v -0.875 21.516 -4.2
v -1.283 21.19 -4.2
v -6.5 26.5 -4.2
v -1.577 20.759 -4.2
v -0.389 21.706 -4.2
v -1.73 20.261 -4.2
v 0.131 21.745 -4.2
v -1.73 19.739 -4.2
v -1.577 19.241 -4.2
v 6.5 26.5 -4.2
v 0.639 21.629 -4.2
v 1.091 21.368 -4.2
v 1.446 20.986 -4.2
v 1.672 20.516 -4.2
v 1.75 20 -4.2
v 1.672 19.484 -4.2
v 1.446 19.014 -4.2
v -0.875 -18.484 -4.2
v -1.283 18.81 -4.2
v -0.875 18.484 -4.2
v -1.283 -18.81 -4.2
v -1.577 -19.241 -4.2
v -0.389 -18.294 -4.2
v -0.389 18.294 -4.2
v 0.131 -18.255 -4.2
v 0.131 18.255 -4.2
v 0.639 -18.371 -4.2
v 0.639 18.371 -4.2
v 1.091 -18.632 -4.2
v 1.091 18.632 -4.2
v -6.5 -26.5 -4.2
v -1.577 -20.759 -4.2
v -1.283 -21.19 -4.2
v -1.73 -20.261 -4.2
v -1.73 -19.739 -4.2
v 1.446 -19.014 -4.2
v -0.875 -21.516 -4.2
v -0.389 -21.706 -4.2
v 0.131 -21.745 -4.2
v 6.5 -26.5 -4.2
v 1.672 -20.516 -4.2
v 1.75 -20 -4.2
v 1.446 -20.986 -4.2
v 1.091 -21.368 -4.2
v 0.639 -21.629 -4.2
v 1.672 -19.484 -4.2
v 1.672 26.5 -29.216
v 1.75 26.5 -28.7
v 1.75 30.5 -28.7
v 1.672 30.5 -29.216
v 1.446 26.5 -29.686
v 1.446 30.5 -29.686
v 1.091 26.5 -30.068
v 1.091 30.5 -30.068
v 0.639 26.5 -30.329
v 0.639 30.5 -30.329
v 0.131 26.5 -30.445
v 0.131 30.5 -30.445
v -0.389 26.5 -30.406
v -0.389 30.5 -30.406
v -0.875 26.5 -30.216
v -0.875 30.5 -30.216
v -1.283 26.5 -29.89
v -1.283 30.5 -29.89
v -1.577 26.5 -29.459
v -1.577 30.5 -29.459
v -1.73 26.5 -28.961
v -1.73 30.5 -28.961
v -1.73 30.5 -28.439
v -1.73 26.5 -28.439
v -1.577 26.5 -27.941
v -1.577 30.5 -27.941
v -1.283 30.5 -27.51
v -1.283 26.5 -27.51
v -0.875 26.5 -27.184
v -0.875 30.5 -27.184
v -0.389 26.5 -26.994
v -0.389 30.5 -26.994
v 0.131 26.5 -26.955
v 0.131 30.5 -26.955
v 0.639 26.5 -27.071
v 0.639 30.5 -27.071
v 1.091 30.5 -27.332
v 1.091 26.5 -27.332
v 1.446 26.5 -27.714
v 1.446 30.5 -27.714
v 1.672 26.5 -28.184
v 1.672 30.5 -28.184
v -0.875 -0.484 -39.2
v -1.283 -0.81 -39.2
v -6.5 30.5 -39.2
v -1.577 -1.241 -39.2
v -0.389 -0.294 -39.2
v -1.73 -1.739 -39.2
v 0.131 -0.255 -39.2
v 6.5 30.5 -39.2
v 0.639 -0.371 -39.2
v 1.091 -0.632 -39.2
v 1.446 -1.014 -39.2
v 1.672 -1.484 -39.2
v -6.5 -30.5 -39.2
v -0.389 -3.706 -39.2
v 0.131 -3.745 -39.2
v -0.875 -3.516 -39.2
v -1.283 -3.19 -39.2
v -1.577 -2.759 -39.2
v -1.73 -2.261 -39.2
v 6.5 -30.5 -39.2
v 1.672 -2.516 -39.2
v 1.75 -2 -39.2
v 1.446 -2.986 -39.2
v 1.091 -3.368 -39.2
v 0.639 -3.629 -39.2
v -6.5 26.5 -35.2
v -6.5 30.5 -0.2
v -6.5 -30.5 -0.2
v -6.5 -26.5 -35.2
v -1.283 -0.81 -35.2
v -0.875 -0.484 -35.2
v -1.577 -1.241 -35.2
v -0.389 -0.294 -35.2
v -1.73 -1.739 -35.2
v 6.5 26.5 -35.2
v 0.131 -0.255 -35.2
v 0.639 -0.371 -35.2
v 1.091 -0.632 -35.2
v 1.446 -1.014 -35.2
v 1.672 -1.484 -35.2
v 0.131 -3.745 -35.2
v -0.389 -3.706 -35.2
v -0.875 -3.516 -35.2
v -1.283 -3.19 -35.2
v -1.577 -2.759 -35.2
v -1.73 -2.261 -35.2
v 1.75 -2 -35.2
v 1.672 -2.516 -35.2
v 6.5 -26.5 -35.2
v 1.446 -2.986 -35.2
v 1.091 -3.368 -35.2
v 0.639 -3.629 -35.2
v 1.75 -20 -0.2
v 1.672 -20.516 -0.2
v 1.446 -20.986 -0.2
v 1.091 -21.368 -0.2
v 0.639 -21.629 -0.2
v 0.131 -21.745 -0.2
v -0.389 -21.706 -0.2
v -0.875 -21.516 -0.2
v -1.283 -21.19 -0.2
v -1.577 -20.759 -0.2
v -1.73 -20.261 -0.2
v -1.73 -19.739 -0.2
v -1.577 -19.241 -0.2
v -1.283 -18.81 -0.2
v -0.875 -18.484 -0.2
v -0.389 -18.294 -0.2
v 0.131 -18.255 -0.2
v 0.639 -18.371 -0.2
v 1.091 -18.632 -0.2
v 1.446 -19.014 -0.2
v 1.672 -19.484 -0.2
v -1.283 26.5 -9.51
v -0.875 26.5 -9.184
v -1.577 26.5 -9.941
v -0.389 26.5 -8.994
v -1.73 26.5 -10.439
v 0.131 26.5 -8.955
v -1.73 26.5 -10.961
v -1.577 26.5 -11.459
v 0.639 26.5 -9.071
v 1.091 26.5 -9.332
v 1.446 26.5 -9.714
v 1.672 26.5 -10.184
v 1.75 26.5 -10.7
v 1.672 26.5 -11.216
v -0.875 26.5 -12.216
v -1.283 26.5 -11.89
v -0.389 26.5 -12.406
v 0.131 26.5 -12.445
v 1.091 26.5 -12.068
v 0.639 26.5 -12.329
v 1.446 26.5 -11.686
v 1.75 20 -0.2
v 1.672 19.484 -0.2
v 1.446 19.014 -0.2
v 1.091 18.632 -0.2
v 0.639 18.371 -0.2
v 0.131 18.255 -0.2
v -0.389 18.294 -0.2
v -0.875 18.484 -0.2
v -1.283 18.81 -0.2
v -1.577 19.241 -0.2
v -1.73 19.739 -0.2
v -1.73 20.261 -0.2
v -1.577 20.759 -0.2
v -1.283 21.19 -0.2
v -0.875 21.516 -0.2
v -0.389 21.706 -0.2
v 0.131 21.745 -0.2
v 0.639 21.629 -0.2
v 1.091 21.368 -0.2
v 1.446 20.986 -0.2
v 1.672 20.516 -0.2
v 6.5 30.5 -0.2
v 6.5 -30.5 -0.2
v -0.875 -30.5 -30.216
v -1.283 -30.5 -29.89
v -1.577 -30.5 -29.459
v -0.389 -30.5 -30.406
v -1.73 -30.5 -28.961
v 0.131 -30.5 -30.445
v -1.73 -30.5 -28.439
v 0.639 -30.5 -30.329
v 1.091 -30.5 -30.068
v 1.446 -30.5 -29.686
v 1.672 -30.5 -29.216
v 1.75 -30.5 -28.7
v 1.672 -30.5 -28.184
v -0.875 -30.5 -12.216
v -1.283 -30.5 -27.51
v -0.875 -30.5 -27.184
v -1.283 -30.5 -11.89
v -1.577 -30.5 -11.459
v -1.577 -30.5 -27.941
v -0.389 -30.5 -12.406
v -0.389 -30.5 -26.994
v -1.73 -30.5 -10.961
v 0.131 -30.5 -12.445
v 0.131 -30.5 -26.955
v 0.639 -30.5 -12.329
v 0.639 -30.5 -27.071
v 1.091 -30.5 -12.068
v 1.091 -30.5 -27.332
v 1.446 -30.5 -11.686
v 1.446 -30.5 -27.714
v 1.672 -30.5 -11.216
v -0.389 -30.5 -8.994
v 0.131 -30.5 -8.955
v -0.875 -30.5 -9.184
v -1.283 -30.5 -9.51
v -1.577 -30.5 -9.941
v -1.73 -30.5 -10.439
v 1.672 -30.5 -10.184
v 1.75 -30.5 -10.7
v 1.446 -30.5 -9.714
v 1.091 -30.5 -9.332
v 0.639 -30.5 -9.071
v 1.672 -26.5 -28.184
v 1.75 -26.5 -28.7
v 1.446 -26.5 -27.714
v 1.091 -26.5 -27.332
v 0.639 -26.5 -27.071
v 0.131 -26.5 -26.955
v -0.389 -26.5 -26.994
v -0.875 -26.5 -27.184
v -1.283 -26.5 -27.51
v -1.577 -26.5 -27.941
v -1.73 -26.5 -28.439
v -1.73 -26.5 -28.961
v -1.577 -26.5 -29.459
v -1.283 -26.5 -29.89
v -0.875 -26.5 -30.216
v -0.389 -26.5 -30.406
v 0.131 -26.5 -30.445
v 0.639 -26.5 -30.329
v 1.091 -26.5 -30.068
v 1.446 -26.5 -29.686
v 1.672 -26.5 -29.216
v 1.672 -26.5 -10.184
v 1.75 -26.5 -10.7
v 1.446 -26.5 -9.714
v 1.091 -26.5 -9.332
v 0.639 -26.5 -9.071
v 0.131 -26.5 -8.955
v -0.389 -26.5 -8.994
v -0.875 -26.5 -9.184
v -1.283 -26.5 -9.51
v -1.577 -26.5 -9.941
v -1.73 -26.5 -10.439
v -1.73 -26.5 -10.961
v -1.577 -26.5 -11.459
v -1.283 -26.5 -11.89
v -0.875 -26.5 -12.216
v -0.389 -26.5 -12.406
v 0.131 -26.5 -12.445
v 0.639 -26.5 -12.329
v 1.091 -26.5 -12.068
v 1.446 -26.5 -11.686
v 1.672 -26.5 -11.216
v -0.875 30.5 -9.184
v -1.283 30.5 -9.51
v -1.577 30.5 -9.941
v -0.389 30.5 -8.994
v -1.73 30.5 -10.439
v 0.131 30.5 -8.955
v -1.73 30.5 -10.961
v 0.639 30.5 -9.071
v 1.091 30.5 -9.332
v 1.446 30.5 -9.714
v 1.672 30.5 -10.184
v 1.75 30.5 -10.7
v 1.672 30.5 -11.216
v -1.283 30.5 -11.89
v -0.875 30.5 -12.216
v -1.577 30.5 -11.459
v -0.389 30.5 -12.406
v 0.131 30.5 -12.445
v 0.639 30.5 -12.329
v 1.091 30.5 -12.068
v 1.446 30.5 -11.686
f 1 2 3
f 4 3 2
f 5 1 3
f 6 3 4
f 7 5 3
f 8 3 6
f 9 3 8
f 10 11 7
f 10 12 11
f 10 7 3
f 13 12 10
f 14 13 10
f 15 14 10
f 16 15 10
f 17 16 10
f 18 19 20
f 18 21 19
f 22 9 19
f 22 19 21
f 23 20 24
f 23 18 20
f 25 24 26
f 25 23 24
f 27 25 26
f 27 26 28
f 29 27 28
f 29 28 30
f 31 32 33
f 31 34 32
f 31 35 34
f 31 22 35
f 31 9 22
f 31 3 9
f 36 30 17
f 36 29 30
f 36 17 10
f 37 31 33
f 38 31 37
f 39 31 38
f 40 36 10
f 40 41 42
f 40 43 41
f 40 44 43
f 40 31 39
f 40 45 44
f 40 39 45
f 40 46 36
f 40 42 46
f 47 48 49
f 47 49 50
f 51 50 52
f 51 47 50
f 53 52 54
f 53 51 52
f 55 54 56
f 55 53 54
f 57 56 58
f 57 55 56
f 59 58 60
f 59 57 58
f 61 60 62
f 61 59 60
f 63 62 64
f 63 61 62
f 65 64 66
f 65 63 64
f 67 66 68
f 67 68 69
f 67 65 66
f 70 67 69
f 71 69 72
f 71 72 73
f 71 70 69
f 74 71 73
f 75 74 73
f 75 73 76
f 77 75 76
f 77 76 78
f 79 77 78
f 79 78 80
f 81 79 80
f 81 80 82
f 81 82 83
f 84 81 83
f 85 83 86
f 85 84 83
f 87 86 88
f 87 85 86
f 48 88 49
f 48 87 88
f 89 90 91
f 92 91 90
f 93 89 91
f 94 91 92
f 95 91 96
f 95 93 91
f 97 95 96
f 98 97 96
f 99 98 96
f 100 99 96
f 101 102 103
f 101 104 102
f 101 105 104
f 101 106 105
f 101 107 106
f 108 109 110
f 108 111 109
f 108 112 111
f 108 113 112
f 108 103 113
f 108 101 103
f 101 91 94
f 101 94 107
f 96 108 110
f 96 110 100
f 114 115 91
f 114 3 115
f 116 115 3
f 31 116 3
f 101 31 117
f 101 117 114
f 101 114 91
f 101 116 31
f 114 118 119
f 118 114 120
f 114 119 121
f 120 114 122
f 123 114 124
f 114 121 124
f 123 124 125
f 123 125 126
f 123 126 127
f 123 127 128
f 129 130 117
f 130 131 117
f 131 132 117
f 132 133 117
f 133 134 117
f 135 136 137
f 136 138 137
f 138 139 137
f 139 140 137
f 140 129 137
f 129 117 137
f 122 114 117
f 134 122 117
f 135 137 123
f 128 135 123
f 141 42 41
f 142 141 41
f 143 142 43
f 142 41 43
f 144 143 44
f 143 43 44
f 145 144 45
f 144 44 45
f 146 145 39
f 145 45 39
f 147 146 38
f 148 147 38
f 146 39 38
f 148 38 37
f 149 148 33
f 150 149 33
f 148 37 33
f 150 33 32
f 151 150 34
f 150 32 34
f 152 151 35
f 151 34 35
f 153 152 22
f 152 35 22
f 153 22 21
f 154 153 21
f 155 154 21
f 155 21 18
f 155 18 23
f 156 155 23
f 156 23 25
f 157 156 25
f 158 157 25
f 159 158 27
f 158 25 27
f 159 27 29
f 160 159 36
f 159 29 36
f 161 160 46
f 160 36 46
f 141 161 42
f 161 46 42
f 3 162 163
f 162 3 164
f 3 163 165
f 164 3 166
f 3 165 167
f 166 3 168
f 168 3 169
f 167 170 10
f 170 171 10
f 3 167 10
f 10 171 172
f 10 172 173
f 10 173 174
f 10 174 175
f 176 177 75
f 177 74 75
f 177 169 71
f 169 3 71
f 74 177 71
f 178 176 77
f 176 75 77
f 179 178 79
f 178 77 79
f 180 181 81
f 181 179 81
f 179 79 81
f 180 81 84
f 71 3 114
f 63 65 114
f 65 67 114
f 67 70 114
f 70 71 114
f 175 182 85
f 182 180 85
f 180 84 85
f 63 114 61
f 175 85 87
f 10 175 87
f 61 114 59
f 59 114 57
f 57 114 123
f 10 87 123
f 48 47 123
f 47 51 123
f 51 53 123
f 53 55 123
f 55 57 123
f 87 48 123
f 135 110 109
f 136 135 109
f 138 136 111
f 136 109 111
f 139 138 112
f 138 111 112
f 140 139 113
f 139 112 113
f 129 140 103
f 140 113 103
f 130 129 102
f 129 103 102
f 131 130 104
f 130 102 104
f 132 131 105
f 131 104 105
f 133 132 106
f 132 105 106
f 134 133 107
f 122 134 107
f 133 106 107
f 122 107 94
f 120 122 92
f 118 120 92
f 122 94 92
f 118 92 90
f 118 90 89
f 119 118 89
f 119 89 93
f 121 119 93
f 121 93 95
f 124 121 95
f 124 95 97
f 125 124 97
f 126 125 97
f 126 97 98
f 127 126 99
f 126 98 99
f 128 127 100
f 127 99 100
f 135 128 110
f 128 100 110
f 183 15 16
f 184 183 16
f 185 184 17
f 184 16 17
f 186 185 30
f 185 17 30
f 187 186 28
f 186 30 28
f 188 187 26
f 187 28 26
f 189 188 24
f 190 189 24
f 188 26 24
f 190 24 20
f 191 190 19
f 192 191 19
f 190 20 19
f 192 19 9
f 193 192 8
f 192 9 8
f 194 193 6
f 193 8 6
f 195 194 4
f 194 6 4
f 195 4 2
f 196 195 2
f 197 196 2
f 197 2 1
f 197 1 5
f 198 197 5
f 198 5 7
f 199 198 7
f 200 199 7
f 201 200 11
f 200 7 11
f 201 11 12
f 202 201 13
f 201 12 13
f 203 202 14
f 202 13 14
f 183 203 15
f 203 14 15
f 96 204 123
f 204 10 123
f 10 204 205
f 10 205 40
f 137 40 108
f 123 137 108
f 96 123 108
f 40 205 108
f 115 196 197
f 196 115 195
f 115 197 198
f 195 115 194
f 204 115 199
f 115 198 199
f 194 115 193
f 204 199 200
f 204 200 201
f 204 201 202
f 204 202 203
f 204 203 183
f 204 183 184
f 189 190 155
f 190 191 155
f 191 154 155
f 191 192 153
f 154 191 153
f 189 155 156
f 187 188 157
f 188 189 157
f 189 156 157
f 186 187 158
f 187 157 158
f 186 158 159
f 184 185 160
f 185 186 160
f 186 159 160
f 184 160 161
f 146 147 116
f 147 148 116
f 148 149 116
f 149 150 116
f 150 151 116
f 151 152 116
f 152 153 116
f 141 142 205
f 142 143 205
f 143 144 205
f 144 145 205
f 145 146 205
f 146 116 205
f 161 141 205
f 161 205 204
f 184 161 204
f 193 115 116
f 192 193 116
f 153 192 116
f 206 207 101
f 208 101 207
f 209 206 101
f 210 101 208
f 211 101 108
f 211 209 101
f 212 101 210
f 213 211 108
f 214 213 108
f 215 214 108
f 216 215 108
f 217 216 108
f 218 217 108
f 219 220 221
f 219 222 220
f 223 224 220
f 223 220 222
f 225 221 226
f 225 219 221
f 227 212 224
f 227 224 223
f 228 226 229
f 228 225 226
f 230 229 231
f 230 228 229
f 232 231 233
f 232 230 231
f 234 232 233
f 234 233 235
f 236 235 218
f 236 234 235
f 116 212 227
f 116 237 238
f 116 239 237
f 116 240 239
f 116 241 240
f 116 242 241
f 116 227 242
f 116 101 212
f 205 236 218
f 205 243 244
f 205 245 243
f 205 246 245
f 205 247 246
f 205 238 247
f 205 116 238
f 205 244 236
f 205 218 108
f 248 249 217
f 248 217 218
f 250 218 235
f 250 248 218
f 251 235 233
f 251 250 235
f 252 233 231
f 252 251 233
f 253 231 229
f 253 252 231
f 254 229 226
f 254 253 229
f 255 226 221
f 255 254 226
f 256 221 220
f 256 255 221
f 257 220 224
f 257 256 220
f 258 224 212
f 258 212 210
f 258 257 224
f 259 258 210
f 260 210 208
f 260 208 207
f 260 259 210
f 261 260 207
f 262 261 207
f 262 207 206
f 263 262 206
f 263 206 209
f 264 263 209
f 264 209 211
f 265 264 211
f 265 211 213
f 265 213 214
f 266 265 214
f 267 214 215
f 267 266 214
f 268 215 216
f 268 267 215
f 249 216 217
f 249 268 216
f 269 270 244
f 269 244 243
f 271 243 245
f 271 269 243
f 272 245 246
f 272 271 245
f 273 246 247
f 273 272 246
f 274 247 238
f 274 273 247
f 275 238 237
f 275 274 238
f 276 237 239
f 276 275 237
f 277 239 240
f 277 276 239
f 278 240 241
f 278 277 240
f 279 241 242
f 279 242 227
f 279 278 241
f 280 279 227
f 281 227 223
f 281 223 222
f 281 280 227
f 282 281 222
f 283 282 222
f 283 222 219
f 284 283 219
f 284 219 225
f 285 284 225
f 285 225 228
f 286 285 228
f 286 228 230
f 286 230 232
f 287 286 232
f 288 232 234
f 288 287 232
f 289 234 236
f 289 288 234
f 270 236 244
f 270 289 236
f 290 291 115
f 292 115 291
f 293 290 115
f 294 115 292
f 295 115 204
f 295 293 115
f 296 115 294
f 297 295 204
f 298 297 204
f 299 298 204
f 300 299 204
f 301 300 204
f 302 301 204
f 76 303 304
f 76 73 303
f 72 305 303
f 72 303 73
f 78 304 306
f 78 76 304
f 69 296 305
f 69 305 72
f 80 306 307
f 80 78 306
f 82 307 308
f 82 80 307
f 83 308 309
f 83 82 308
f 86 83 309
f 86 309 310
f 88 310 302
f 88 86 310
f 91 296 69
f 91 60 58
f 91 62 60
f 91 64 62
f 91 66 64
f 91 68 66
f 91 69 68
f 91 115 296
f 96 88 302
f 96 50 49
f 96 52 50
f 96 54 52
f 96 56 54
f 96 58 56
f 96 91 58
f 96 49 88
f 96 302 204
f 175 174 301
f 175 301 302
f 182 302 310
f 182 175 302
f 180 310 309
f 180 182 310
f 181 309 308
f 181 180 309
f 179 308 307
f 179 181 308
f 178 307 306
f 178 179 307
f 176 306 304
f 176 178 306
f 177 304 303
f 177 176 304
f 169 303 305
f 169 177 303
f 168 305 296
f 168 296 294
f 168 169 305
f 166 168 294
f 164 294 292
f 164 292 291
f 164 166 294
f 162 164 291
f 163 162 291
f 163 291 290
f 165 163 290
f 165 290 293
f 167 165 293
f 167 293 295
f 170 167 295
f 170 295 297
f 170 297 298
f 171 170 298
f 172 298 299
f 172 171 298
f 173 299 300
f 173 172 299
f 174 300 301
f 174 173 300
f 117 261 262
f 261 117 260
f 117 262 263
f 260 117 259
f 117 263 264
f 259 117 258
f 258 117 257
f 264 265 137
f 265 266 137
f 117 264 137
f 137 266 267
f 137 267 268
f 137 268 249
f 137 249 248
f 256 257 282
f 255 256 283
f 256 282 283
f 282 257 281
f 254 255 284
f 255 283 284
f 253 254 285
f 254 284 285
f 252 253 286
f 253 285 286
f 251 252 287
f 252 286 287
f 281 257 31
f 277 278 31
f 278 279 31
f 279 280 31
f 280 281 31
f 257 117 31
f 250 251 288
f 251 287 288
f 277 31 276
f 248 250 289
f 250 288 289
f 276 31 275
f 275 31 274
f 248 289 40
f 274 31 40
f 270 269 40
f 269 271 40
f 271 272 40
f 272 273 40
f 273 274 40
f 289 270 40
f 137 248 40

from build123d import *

# Parameters (mm, degrees)
SKETCH077_W     = 13
SKETCH077_H     = 39
SKETCH077_R     = 1.75
PAD053_DEPTH    = 4
SKETCH082_W     = 13
SKETCH082_H     = 4
PAD054_DEPTH    = 53
SKETCH083_W     = 13
SKETCH083_H     = 39
SKETCH083_R     = 1.75
PAD055_DEPTH    = 4
SKETCH084_R     = 1.75
POCKET017_DEPTH = 4
SKETCH085_R     = 1.75
POCKET018_DEPTH = 4


with BuildPart() as part:
    # Sketch077 → Pad053 (new body)
    with BuildSketch(Plane.XZ):
        with Locations((0, -19.7)):
            Rectangle(SKETCH077_W, SKETCH077_H)
        with Locations((0, -10.7)):
            Circle(SKETCH077_R, mode=Mode.SUBTRACT)
        with Locations((0, -28.7)):
            Circle(SKETCH077_R, mode=Mode.SUBTRACT)
    extrude(amount=PAD053_DEPTH)

    # Sketch082 (on Face7 of Pad053) → Pad054 (join)
    with BuildSketch(Plane(origin=(0, 0, 0), x_dir=(1, 0, 0), z_dir=(0, 1, 0))):
        with Locations((0, 37.2)):
            Rectangle(SKETCH082_W, SKETCH082_H)
        with Locations((0, 2.2)):
            Rectangle(SKETCH082_W, SKETCH082_H)
    extrude(amount=PAD054_DEPTH)

    # Sketch083 (on Face12 of Pad054) → Pad055 (join)
    with BuildSketch(Plane(origin=(0, 53, 0), x_dir=(1, 0, 0), z_dir=(0, 1, 0))):
        with Locations((0, 19.7)):
            Rectangle(SKETCH083_W, SKETCH083_H)
        with Locations((0, 28.7)):
            Circle(SKETCH083_R, mode=Mode.SUBTRACT)
        with Locations((0, 10.7)):
            Circle(SKETCH083_R, mode=Mode.SUBTRACT)
    extrude(amount=PAD055_DEPTH)

    # Sketch084 (on Face18 of Pad055) → Pocket017 (cut)
    with BuildSketch(Plane(origin=(0, 0, -4.2), x_dir=(1, 0, 0), z_dir=(0, 0, -1))):
        with Locations((0, -6.5)):
            Circle(SKETCH084_R)
        with Locations((0, -46.5)):
            Circle(SKETCH084_R)
    extrude(amount=-POCKET017_DEPTH, mode=Mode.SUBTRACT)

    # Sketch085 (on Face15 of Pad054) → Pocket018 (cut)
    with BuildSketch(Plane(origin=(0, 0, -39.2), x_dir=(1, 0, 0), z_dir=(0, 0, -1))):
        with Locations((0, -24.5)):
            Circle(SKETCH085_R)
    extrude(amount=-POCKET018_DEPTH, mode=Mode.SUBTRACT)


with BuildPart() as part_1:
    # Body018 placement: moved
    add(part.part.moved(Location((0, -26.5, 0))))


solid = part_1.part
